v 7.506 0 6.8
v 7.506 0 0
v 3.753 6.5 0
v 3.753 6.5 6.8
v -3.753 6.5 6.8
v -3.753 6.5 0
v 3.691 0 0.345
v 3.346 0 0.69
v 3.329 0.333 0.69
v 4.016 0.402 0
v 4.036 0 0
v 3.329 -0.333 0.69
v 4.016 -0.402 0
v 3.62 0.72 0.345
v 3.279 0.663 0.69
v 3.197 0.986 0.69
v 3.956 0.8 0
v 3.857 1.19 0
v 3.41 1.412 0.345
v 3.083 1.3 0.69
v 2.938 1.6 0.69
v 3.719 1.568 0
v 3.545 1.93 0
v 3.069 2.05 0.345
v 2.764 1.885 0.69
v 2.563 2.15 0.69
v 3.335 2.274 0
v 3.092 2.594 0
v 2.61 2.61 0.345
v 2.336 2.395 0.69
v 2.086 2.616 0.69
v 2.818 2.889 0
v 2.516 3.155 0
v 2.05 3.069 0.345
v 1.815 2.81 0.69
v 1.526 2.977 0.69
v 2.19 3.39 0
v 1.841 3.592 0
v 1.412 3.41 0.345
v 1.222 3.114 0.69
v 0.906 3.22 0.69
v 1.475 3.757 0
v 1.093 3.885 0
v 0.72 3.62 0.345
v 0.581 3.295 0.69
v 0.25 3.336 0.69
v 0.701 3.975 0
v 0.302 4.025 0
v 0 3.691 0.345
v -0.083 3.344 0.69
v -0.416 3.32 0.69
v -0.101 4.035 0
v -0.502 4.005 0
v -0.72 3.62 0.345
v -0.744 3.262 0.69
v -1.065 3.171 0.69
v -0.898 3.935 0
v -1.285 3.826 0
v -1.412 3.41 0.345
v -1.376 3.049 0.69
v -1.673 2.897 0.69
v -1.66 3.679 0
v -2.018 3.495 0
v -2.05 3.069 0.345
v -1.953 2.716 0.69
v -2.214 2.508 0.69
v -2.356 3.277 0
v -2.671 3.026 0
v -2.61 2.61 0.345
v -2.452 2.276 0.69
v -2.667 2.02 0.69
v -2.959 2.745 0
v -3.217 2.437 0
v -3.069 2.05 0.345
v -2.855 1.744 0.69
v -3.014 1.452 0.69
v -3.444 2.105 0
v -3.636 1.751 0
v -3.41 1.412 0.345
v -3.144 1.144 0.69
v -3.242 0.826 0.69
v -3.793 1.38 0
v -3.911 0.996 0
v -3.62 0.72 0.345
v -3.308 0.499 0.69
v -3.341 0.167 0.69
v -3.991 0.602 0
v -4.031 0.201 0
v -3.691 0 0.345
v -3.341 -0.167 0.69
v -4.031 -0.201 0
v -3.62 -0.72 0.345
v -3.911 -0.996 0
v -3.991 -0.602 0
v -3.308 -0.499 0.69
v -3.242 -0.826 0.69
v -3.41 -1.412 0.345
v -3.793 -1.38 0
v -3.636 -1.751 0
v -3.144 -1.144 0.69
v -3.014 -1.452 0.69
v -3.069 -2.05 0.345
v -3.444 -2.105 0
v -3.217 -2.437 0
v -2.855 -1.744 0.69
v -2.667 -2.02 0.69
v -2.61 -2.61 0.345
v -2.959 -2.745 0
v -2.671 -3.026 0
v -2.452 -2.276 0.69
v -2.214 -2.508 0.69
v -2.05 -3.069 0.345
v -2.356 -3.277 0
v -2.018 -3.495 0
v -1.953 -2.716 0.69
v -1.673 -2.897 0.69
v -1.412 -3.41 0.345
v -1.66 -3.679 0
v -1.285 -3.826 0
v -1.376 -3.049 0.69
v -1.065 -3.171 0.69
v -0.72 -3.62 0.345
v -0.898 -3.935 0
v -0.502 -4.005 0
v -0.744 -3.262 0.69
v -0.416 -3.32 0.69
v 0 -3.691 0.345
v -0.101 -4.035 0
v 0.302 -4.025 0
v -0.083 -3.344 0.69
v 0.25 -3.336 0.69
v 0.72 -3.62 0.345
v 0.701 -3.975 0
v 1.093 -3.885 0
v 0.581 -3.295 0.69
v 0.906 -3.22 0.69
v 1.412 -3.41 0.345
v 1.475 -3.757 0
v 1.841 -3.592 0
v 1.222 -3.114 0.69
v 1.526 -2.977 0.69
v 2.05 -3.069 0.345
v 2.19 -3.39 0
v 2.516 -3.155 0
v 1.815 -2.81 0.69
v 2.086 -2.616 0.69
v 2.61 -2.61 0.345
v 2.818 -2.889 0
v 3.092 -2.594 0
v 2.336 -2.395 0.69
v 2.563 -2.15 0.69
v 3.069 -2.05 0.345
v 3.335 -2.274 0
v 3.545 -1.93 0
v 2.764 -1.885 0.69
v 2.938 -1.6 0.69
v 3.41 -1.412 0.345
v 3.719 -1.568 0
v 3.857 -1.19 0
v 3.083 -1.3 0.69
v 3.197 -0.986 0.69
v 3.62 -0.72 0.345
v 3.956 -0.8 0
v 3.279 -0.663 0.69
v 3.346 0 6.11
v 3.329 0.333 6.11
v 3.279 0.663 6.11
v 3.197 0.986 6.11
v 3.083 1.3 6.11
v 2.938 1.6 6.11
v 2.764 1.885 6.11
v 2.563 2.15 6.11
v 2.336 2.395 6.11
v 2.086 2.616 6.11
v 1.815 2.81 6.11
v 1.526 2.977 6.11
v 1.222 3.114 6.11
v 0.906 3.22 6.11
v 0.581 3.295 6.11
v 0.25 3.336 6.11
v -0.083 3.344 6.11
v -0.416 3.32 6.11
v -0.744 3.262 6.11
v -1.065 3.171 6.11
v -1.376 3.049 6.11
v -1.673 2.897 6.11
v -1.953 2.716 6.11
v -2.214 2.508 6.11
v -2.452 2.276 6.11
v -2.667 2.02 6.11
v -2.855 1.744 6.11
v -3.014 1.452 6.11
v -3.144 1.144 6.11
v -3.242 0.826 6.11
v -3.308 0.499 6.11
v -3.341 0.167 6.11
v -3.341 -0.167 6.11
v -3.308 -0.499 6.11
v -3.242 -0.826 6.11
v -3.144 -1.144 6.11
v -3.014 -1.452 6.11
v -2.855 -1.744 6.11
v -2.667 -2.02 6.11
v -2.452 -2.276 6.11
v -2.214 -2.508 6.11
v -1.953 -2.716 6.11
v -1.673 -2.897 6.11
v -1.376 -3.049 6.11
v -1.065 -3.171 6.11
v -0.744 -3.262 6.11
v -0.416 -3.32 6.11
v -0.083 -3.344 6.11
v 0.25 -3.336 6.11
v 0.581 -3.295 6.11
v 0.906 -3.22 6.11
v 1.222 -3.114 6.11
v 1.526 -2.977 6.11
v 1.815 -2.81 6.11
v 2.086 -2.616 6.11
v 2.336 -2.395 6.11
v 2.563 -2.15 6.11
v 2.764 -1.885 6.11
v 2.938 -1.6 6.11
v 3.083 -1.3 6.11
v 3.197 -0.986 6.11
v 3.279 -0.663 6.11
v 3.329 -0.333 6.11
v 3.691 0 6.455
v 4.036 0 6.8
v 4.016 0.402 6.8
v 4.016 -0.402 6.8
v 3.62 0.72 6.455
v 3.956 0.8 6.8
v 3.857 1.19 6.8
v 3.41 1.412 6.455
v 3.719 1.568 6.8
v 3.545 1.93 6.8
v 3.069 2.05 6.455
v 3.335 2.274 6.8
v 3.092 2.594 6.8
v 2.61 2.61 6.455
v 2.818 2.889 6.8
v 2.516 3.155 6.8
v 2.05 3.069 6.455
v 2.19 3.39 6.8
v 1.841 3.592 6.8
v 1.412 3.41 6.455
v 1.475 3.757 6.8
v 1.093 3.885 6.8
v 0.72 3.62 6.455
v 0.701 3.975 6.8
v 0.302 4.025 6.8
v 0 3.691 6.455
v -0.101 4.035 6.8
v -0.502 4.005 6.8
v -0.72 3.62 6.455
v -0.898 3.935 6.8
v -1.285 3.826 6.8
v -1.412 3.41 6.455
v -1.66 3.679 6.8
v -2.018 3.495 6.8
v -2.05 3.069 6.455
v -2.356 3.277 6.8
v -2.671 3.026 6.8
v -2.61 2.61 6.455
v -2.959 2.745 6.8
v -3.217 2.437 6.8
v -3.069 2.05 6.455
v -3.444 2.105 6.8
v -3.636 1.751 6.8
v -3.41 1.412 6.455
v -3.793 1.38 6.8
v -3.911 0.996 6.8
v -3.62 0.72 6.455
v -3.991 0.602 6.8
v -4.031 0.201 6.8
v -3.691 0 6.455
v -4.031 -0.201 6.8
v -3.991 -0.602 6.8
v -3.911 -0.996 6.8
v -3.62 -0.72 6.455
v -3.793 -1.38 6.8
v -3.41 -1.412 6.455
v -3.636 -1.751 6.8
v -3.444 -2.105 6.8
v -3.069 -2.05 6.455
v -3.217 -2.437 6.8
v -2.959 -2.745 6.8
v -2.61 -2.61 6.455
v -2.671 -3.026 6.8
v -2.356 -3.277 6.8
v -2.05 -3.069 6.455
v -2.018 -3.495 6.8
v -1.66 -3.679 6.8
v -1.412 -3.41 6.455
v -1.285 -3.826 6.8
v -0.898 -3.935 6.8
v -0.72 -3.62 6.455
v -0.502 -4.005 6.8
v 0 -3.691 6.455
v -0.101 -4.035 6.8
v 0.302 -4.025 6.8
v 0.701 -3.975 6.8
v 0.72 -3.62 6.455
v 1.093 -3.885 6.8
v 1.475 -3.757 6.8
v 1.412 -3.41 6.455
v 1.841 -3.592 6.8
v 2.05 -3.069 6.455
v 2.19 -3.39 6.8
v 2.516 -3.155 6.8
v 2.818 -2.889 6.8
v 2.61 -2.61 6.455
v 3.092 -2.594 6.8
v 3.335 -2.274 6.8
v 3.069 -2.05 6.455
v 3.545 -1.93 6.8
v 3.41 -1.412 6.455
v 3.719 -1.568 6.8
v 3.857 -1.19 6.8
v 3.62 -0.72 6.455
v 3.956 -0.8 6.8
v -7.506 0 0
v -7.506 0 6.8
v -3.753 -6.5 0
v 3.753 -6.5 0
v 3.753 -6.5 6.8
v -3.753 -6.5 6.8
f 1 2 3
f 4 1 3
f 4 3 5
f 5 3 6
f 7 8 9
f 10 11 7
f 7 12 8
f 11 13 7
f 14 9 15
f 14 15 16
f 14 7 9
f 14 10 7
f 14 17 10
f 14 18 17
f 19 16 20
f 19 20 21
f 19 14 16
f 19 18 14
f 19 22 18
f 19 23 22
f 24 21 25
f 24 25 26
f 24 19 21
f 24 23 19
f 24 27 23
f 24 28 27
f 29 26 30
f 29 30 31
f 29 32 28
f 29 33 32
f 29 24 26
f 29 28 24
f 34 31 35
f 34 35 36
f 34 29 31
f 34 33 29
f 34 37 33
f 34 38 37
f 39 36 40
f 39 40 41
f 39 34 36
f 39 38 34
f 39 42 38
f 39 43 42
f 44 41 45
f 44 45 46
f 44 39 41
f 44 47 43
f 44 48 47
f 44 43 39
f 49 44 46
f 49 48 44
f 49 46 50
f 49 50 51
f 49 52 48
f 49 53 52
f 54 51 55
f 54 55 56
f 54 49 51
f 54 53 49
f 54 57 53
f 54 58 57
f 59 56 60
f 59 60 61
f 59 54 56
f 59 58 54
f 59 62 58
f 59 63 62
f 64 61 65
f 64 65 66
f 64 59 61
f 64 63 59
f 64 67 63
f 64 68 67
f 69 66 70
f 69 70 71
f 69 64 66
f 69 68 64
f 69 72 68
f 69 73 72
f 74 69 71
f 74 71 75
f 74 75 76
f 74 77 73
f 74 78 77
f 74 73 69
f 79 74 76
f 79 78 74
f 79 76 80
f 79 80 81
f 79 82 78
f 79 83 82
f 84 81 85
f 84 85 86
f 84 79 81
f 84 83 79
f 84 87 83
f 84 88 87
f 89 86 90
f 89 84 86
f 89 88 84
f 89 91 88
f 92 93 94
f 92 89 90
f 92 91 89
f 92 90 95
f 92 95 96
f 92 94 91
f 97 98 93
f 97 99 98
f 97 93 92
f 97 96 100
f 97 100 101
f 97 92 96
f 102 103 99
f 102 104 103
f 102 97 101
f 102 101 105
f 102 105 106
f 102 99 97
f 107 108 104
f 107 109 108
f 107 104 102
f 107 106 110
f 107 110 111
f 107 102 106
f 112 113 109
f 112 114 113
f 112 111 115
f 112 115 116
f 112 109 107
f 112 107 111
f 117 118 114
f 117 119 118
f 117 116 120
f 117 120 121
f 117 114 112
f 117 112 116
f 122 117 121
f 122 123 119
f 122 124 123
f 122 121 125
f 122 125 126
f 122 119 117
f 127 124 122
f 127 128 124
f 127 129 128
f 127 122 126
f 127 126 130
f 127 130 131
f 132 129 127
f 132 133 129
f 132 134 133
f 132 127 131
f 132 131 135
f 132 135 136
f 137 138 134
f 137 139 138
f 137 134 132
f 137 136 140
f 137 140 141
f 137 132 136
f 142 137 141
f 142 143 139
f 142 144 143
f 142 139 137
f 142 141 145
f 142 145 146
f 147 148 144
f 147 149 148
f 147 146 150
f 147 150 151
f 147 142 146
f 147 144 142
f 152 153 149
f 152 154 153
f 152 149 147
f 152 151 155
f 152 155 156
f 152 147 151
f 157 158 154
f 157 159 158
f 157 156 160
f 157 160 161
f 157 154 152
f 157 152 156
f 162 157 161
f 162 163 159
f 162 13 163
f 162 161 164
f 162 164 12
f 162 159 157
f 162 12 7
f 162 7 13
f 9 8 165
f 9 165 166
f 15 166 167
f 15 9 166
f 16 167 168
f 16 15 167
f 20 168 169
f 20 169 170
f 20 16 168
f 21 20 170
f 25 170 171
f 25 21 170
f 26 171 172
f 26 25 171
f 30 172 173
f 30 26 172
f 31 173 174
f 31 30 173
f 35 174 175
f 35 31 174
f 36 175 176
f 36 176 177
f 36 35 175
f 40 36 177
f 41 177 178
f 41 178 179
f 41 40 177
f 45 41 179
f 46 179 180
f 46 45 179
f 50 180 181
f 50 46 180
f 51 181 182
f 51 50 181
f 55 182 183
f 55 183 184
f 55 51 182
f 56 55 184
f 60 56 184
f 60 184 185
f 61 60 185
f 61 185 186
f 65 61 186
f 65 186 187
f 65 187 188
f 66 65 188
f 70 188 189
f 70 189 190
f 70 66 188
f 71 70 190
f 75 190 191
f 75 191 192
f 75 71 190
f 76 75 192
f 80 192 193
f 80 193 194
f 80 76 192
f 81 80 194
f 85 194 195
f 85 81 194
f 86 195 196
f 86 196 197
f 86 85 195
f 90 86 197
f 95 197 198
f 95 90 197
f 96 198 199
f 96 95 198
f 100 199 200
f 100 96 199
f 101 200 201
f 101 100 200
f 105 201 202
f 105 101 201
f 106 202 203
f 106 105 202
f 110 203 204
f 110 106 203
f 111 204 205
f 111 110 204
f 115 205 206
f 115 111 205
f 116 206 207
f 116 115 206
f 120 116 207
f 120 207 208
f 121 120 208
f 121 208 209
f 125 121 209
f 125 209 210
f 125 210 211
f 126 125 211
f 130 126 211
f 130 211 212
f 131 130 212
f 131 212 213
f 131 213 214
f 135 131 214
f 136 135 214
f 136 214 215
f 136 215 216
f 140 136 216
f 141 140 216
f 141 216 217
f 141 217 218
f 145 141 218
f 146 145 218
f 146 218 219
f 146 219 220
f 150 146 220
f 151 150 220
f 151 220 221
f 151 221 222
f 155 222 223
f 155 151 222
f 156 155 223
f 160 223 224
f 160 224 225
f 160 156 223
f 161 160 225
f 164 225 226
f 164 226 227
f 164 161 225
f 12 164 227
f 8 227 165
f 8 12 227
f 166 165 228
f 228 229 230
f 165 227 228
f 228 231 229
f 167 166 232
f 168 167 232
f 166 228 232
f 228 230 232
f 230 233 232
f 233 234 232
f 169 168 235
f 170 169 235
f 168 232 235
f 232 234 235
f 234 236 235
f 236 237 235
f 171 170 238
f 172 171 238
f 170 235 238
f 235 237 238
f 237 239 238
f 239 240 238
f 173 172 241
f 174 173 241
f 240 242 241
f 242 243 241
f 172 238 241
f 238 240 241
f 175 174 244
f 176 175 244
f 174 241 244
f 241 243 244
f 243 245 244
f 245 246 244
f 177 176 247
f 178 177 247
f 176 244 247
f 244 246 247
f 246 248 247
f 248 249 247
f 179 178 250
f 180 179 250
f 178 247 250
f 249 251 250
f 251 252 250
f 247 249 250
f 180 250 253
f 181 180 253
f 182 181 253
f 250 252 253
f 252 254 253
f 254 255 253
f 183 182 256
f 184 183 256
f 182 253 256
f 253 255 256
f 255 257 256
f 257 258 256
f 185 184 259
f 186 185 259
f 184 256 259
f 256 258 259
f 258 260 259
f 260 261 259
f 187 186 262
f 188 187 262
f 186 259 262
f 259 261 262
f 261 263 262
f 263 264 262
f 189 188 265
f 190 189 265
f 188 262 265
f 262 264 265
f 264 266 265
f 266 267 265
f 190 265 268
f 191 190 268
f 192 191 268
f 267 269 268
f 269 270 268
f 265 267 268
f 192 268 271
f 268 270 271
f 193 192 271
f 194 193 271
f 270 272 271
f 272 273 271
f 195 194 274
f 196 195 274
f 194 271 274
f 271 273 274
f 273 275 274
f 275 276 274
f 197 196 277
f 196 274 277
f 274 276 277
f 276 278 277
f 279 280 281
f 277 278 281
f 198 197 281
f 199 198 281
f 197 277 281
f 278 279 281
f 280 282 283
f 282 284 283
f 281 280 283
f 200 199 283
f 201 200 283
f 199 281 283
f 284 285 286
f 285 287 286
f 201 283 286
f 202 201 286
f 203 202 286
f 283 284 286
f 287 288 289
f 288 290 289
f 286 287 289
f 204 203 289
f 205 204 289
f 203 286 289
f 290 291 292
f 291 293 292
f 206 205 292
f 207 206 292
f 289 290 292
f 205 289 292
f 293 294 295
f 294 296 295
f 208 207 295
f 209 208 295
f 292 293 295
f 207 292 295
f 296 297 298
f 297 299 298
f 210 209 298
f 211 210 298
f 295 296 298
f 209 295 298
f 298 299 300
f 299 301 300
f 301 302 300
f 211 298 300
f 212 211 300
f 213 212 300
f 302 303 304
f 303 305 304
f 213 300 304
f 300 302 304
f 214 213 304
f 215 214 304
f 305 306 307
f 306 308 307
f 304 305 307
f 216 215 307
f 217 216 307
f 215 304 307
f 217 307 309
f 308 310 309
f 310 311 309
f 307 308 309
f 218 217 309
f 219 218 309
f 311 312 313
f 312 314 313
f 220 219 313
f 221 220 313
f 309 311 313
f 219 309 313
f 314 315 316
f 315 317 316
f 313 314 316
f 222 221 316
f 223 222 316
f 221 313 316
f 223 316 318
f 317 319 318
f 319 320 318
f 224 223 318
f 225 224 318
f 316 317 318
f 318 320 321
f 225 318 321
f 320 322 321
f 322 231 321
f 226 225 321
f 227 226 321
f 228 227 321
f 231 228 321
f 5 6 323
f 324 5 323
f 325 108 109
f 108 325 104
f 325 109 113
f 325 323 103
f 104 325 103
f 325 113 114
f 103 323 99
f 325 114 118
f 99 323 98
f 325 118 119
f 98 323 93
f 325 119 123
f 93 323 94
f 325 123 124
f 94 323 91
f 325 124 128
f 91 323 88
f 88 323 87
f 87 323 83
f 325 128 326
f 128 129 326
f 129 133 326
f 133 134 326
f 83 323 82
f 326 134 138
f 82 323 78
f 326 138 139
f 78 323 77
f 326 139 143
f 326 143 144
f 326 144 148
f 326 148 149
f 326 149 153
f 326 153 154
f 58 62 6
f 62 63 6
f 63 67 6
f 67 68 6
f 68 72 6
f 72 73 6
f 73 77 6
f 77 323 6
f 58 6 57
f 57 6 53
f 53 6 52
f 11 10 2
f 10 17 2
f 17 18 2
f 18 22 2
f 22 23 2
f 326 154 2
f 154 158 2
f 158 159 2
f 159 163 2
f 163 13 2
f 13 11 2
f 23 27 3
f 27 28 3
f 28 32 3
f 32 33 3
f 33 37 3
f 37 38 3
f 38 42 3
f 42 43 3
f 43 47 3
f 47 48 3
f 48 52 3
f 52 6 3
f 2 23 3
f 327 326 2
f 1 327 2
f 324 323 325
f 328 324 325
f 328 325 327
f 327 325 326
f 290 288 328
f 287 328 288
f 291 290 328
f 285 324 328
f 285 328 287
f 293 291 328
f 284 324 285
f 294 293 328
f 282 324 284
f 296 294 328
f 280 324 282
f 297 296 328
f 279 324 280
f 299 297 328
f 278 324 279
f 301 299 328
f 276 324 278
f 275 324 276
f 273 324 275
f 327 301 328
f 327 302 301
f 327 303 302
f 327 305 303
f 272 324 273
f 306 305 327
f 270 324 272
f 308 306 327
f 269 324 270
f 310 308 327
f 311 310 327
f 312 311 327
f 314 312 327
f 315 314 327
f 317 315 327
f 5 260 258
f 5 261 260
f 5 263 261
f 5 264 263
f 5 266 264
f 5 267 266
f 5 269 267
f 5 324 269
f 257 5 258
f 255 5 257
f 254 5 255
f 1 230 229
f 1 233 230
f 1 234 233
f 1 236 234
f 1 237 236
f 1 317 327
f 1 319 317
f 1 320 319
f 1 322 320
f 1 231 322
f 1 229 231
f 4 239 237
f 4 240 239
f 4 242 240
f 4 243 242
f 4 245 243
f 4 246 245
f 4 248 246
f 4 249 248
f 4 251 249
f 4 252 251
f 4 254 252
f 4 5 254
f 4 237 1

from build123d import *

# Parameters (mm, degrees)
SKETCH_1_R      = 3.3455
EXTRUDE_1_DEPTH = 6.8
CHAMFER_1_SIZE  = 0.6905


with BuildPart() as part:
    # Эскиз1 → Бобышка-Вытянуть1 (new body)
    with BuildSketch(Plane.XY):
        Polygon((-3.75277675, 6.5), (-7.505553499, 0), (-3.75277675, -6.5), (3.75277675, -6.5), (7.505553499, 0), (3.75277675, 6.5), align=None)
        Circle(SKETCH_1_R, mode=Mode.SUBTRACT)
    extrude(amount=EXTRUDE_1_DEPTH)

    # Фаска1
    chamfer_1_edges = [part.edges().sort_by_distance(p)[0] for p in [
        (-3.3455, 0, 0),
        (-3.3455, 0, 6.8),
    ]]
    chamfer(chamfer_1_edges, length=CHAMFER_1_SIZE)


solid = part.part
